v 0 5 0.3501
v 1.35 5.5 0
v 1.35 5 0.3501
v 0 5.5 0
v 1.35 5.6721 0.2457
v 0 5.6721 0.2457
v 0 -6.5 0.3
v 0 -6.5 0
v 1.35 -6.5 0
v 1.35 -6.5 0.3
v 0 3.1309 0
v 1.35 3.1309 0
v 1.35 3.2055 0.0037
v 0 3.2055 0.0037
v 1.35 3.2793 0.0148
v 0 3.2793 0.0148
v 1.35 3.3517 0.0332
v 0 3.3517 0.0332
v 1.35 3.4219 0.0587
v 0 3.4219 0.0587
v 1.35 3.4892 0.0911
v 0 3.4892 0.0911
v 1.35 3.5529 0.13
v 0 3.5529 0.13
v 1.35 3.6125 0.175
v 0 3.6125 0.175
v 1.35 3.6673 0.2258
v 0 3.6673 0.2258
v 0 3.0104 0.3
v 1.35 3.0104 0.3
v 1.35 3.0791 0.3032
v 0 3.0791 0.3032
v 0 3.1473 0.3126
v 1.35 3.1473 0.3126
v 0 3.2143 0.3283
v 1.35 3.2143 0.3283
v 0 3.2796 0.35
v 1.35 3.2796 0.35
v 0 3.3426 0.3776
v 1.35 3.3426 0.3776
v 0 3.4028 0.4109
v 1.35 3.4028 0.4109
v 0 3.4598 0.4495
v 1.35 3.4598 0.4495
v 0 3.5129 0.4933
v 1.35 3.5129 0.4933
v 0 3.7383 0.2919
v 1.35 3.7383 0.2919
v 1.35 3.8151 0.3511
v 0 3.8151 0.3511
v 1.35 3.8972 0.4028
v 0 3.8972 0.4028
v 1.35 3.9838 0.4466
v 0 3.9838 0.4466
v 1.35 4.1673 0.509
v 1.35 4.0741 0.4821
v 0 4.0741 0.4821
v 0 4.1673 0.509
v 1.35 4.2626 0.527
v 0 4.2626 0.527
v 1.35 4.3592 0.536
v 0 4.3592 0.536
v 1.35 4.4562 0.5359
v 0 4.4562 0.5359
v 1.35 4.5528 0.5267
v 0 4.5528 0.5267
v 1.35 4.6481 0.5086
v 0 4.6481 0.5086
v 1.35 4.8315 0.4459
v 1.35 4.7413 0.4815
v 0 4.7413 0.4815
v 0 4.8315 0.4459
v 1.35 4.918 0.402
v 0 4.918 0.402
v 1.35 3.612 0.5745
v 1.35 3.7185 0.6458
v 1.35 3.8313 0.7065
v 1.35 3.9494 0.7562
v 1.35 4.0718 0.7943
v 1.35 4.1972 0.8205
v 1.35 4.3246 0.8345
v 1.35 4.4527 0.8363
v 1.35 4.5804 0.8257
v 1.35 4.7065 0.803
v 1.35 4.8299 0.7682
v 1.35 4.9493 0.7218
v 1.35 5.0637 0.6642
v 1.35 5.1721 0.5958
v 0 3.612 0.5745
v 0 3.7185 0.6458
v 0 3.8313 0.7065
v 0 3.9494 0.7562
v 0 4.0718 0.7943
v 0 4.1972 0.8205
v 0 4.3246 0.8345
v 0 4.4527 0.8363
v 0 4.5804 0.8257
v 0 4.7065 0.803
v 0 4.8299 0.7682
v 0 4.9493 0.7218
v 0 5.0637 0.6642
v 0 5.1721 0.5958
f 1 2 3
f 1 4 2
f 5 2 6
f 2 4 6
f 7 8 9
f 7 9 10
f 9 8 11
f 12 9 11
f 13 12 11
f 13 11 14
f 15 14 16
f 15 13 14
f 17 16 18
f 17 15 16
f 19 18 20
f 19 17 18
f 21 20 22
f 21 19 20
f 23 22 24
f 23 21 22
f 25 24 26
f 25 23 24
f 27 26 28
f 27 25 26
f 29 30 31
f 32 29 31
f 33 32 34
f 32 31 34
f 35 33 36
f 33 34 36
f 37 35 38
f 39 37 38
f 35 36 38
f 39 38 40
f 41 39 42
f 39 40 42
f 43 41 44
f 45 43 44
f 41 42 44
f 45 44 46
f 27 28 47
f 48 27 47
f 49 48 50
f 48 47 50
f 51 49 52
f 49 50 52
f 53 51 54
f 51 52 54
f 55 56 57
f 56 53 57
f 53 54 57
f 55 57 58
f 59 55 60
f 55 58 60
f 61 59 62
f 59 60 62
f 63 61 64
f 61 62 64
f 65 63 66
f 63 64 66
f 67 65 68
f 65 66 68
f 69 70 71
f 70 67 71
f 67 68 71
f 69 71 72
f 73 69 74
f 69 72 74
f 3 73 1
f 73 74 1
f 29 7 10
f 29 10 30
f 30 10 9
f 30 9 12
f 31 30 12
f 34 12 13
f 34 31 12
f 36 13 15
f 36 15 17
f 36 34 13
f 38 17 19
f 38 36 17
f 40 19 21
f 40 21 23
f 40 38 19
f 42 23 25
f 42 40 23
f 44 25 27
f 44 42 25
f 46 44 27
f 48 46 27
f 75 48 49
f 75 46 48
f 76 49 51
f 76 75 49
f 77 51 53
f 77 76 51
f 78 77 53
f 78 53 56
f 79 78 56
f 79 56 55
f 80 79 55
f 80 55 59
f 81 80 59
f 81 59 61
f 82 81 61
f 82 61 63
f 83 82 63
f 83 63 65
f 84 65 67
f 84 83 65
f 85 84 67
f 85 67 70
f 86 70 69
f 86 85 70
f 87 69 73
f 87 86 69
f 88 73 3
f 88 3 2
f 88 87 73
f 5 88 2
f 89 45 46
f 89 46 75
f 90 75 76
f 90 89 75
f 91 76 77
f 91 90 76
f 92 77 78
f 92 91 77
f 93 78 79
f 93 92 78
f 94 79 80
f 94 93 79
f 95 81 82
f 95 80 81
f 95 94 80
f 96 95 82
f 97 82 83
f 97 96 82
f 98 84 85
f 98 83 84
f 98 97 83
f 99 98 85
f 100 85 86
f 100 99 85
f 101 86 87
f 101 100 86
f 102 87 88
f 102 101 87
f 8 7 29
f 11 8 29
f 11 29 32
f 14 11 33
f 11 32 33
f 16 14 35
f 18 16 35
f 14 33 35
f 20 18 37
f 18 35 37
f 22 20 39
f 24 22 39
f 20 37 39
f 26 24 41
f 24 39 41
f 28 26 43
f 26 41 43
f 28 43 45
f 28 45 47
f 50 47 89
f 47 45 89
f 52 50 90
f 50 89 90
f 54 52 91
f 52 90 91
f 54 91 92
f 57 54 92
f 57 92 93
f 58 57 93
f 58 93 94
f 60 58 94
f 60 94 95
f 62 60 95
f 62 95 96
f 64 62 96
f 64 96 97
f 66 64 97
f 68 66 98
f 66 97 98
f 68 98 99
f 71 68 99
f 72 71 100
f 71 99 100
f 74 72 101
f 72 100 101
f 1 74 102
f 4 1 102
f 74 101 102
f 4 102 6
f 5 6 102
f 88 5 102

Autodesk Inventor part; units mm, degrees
ref_plane "YZ Plane" through (0, 0, 0) normal (1, 0, 0) x (0, 1, 0)
ref_plane "XZ Plane" through (0, 0, 0) normal (0, 1, 0) x (-1, 0, 0)
ref_plane "XY Plane" through (0, 0, 0) normal (0, 0, 1) x (1, 0, 0)
sketch "Sketch1" plane through (0, 0, 0) normal (1, 0, 0) x (0, 1, 0)
  line L0 (-6.5, 0) -> (3.5, 0)
  line L1 (-6.5, 0) -> (-6.5, 0.3)
  line L2 (-6.5, 0.3) -> (3.337, 0.3)
  line L3 (5.5, 0) -> (5.6721, 0.2457)
  line L4 (5.6721, 0.2457) -> (5.1721, 0.5958)
  line L5 (5.5, 0) -> (5, 0.3501)
  arc A0 (5, 0.3501) -> (3.5, 0) centre (4.4069, -0.497) ccw
  arc A1 (5.1721, 0.5958) -> (3.337, 0.3) centre (4.4069, -0.497) ccw
  point P0 (0, 0)
  dimension "d0" = 0.3
  dimension "d3" = 6.5
  dimension "d4" = 10
  dimension "d5" = 35
  dimension "d6" = 2
  dimension "d7" = 0.3
  dimension "d8" = 1.5
extrude "Extrusion1" add sketch "Sketch1" along normal blind 1.35
fillet "Fillet1" radius 0.75 1 edges at (0.675, 3.337, 0.3)
fillet "Fillet2" radius 0.75 1 edges at (0.675, 3.5, 0)
equation "\"d7\" = d0"
properties material "Bronze, Soft Tin"
